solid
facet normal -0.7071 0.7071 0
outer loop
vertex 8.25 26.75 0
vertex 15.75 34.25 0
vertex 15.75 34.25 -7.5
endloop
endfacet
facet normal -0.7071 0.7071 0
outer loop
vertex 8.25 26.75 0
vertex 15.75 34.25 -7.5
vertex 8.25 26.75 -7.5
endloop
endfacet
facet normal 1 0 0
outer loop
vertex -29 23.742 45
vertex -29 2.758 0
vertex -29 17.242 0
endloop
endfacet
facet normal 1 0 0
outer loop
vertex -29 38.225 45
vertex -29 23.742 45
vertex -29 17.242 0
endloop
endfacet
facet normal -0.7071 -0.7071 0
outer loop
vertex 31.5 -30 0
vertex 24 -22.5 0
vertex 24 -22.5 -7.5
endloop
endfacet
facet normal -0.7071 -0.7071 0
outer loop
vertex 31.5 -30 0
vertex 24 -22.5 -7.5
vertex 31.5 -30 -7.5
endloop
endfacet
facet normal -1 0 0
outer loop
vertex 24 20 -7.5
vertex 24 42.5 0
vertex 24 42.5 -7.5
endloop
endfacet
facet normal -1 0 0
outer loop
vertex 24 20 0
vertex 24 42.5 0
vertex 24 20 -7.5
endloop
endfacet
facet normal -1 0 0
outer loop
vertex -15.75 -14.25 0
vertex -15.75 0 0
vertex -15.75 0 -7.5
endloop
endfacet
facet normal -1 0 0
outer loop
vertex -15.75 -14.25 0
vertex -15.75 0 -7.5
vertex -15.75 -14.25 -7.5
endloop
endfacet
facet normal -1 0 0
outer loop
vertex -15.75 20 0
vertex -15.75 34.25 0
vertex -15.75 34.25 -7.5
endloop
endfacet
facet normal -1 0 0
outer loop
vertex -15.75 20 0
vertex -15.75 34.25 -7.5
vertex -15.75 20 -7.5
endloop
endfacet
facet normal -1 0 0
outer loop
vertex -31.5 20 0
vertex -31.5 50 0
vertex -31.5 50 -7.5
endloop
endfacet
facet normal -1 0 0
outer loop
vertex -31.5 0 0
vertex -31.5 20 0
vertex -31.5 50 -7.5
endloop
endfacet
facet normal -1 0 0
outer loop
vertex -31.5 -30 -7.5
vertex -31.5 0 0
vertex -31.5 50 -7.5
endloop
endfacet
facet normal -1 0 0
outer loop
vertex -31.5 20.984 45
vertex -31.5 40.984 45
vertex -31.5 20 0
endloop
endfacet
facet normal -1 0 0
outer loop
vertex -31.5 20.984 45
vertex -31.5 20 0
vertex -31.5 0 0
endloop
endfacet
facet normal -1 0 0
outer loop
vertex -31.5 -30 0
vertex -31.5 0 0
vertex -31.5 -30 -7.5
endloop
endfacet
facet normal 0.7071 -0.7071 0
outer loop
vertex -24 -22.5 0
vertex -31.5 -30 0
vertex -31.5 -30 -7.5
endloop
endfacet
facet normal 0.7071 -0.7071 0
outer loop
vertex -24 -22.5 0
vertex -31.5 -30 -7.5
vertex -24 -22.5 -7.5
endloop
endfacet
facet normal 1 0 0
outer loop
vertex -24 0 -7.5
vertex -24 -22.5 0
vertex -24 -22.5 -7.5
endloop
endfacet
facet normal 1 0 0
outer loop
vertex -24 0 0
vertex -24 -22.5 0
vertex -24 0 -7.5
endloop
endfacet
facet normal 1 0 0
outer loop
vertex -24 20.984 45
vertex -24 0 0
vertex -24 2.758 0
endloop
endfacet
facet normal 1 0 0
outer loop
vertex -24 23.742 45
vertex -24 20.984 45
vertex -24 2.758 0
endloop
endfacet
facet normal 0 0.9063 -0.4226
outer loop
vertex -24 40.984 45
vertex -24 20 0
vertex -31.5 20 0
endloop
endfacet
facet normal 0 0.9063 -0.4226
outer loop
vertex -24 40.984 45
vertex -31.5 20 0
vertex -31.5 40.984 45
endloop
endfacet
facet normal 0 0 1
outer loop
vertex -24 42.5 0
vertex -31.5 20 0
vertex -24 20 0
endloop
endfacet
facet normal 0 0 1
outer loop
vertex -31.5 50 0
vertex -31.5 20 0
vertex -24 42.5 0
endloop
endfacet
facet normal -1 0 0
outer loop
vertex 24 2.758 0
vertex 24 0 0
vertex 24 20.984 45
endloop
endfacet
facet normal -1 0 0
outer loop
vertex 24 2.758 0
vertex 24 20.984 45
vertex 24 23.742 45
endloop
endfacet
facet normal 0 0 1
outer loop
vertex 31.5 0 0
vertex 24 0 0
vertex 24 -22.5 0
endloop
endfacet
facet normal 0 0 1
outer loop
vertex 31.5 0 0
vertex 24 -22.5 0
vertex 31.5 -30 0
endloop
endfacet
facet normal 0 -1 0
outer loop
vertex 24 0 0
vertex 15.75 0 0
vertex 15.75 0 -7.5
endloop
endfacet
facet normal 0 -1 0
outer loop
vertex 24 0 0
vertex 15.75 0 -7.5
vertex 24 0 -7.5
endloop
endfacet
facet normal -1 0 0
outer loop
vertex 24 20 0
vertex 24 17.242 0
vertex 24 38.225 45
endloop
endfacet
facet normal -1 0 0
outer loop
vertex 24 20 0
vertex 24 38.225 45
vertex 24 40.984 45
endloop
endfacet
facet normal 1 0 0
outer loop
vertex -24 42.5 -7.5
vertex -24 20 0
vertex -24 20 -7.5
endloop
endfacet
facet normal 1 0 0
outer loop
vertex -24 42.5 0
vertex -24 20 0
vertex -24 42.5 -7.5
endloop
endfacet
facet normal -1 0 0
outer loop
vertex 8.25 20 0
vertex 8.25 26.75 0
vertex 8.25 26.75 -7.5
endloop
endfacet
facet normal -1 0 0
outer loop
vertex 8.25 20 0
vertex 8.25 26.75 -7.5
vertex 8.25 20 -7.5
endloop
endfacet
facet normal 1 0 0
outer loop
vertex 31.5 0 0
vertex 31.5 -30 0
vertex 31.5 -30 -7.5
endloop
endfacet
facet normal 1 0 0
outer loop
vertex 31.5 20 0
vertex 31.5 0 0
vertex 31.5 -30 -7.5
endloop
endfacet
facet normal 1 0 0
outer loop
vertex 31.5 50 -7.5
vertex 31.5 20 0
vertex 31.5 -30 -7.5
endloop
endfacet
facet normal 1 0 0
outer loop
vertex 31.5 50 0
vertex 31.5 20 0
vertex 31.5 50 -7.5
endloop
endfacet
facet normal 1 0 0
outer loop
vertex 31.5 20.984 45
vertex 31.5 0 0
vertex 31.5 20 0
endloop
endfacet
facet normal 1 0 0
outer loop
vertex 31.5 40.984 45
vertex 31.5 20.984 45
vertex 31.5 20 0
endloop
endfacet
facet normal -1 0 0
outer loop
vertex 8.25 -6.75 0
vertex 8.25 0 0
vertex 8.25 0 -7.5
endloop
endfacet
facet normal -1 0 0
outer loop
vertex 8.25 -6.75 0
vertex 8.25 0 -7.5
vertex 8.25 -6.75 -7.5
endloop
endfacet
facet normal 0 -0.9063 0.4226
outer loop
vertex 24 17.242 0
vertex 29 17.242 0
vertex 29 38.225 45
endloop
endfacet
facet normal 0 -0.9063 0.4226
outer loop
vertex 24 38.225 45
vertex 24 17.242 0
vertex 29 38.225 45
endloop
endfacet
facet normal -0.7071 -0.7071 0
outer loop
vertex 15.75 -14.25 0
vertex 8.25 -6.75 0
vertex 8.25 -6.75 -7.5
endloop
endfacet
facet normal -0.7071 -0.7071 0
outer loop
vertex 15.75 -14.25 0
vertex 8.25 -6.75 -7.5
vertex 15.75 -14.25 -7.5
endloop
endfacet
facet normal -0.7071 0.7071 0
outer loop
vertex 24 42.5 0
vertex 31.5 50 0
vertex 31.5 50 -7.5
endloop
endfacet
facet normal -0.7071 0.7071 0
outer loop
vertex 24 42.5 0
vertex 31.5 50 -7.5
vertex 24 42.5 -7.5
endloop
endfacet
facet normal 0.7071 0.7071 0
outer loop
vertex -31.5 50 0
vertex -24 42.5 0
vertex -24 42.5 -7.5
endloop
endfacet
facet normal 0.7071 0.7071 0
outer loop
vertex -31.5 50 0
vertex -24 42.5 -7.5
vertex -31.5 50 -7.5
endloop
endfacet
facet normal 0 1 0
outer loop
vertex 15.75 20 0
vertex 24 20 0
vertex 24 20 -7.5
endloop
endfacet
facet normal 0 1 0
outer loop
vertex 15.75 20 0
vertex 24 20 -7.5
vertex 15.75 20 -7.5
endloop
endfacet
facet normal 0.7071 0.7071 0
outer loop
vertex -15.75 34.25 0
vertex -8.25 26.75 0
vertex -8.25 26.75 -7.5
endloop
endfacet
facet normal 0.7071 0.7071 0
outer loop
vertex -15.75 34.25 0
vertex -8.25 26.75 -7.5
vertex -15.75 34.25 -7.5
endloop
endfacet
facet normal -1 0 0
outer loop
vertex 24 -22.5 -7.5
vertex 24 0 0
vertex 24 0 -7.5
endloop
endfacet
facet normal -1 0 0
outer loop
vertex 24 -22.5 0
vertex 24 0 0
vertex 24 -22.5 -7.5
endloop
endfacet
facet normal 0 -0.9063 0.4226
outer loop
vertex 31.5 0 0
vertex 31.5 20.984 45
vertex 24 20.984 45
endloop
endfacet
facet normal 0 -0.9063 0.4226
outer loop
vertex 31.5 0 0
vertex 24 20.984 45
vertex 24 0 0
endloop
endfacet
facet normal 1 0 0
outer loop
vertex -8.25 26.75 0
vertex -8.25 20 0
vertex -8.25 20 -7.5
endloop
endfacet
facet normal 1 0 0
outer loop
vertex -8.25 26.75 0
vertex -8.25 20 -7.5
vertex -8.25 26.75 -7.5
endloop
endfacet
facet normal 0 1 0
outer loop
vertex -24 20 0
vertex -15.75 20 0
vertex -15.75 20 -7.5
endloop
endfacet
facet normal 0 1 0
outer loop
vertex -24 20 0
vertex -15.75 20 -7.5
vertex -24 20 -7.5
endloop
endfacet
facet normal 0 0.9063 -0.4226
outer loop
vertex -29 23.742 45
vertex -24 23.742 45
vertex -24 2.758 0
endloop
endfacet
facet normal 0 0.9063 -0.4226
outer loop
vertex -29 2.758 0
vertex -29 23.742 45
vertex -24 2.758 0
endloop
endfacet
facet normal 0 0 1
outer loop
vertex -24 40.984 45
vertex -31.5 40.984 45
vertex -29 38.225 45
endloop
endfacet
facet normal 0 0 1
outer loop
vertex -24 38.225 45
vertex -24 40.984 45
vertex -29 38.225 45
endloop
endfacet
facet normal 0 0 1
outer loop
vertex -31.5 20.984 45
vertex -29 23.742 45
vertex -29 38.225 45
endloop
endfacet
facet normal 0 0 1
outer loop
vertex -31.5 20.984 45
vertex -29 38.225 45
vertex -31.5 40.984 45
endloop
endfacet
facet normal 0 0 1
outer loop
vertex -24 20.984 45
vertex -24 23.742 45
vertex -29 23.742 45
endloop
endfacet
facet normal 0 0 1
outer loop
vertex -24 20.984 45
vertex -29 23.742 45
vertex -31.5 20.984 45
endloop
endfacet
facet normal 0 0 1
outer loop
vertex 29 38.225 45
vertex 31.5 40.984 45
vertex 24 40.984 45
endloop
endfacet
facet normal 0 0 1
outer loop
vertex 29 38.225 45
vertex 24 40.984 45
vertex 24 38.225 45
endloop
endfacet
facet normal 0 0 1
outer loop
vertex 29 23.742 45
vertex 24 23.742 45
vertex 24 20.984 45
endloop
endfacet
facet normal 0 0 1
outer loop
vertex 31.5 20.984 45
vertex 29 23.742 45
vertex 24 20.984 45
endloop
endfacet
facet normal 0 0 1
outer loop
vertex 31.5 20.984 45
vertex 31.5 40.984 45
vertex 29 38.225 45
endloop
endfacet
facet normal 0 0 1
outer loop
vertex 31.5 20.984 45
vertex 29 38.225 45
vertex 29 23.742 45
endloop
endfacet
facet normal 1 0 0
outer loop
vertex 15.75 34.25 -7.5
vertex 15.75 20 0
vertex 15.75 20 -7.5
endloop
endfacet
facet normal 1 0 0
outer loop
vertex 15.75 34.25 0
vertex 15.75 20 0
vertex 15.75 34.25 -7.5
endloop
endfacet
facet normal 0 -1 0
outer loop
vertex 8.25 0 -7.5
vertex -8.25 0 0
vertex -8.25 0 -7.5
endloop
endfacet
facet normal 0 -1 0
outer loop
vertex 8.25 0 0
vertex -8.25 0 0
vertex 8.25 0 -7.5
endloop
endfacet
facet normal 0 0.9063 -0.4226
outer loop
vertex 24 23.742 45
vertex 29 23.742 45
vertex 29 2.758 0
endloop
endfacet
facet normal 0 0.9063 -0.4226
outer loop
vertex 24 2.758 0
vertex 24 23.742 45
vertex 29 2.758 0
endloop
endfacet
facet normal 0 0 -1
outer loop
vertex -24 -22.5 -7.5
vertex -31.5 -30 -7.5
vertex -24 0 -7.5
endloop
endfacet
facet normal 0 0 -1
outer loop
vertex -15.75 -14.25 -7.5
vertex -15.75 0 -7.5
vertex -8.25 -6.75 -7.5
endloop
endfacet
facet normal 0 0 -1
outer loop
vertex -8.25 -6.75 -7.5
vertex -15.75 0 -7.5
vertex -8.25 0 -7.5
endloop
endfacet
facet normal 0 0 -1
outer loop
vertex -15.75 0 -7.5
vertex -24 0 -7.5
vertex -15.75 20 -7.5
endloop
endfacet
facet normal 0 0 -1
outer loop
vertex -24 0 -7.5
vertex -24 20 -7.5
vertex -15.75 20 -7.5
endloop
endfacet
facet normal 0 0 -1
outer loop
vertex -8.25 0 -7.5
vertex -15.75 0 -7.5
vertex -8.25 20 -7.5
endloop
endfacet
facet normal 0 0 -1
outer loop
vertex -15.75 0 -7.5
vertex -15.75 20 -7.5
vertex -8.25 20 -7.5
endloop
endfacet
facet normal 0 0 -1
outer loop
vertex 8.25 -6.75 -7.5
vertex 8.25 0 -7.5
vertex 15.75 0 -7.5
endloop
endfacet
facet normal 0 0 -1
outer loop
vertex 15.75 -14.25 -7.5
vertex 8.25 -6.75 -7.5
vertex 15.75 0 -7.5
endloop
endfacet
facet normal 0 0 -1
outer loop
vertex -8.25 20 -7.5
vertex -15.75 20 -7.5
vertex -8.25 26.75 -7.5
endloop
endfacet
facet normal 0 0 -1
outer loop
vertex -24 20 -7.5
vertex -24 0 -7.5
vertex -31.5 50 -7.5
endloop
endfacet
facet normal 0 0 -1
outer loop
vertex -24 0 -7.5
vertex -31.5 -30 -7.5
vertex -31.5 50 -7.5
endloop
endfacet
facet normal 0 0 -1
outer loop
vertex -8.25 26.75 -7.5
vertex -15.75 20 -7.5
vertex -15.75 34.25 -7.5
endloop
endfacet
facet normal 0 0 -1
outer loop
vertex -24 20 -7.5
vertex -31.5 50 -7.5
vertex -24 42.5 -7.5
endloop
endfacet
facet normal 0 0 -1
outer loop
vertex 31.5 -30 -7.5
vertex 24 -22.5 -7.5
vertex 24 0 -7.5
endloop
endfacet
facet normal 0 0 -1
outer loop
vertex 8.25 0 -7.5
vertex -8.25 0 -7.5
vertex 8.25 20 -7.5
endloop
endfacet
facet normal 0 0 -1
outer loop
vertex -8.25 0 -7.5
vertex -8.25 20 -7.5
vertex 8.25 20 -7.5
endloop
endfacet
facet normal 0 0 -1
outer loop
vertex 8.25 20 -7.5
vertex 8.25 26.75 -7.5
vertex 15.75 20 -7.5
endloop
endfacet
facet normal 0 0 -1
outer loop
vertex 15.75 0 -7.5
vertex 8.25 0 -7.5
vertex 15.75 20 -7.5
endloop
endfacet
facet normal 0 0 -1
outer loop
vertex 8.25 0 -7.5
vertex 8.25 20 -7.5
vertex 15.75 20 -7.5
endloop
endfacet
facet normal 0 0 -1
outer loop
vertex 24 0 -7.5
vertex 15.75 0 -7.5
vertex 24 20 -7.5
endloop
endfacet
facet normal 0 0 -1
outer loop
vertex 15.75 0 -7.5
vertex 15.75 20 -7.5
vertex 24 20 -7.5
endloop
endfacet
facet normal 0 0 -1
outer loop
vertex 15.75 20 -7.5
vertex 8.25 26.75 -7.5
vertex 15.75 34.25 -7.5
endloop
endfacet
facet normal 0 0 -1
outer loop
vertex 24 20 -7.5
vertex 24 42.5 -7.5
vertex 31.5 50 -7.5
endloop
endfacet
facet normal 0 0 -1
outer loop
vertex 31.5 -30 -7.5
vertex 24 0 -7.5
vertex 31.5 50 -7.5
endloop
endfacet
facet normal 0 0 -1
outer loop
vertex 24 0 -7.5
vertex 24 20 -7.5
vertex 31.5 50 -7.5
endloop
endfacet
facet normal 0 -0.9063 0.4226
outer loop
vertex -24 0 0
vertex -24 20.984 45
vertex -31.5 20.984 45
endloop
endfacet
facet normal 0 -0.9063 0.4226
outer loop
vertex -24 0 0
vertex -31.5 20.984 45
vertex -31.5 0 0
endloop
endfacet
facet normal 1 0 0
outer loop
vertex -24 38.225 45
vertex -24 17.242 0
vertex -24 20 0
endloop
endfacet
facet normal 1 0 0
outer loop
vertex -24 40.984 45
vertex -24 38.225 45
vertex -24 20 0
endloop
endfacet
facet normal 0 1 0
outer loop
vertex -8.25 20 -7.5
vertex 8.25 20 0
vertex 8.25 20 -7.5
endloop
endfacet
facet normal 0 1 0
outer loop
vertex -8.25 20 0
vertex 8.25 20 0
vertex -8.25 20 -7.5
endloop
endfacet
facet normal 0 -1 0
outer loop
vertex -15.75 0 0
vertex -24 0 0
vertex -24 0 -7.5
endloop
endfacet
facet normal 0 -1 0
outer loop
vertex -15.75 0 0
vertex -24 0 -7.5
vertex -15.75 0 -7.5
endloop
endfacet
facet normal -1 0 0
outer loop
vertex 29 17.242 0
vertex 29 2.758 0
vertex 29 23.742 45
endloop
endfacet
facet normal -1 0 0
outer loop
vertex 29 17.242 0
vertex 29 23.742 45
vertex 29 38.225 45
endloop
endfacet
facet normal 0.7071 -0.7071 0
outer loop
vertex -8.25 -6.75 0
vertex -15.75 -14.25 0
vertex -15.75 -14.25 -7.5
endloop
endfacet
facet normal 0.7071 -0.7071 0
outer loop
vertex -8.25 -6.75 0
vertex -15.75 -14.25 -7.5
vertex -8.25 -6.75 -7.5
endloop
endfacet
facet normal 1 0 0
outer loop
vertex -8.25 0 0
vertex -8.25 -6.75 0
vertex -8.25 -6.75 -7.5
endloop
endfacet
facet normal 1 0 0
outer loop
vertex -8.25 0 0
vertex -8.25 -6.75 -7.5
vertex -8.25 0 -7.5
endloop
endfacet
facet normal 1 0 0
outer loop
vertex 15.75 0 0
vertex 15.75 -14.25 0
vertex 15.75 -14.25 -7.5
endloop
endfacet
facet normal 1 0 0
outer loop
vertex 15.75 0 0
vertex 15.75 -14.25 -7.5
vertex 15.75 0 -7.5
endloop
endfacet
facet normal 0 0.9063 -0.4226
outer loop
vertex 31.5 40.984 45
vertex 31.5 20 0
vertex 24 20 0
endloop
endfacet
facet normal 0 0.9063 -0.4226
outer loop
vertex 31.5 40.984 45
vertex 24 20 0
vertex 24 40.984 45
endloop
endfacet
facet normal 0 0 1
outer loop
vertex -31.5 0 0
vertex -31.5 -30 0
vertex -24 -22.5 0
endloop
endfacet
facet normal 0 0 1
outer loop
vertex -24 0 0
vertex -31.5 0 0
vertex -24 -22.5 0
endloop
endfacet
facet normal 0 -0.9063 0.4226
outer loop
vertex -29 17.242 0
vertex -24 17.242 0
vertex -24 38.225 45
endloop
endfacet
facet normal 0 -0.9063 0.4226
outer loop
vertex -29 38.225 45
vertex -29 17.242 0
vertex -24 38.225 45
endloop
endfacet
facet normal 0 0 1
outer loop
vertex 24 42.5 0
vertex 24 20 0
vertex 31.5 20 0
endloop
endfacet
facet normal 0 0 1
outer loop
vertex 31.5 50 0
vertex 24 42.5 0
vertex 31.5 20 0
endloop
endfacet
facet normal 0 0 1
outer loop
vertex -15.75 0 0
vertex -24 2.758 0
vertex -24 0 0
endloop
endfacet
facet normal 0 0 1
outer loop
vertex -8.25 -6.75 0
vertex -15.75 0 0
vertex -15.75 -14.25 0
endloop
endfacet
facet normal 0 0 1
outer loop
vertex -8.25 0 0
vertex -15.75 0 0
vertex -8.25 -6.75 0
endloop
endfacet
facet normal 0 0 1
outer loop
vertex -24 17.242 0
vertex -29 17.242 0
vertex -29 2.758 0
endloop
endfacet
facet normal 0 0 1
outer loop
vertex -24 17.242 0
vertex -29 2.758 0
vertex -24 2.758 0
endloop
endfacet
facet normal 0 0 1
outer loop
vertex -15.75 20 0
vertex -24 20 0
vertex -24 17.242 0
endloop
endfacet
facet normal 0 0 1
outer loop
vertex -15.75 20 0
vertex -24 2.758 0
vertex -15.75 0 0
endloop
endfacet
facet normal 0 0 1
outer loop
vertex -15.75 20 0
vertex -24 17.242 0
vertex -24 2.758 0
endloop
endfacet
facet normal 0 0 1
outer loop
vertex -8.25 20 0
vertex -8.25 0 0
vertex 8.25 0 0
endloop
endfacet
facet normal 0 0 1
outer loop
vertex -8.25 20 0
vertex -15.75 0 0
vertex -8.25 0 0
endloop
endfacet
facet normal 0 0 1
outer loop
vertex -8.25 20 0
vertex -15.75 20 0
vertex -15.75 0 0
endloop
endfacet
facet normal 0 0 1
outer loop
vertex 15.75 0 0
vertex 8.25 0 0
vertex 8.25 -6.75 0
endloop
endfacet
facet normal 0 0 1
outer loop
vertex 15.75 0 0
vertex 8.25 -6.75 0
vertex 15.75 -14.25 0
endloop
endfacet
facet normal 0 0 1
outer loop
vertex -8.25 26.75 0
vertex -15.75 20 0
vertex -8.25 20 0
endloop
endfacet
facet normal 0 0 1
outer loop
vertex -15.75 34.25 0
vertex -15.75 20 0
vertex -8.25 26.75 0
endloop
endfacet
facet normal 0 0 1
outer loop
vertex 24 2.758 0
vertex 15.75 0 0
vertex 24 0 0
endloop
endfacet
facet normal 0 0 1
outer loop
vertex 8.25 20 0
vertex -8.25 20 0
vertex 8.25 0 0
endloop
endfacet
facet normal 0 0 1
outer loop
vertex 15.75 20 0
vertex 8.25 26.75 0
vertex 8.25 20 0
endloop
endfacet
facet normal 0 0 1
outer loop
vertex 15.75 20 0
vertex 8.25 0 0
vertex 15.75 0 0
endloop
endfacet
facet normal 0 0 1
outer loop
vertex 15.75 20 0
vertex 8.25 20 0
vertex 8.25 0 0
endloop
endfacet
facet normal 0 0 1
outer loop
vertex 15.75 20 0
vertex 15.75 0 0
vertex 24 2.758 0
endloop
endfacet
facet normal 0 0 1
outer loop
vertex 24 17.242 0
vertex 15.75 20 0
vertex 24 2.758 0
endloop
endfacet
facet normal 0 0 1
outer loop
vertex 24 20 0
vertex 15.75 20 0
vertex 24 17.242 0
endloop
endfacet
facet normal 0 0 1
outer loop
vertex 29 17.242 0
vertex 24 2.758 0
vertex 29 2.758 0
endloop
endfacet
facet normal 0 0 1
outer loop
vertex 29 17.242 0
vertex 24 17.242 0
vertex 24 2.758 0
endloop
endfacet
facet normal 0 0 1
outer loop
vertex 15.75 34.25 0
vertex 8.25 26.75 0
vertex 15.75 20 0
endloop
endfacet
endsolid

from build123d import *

# Parameters (mm, degrees)
F1_DEPTH = 31.5
F2_DEPTH = 29
F3_DEPTH = 24
F5_DEPTH = 7.5


with BuildPart() as f1:
    # F0 (on Right) → F1 (new body, symmetric)
    with BuildSketch(Plane.YZ):
        Polygon((20.983844617, 45), (0, 0), (2.7584447974, 0), (23.7422894144, 45), align=None)
        Polygon((23.7422894144, 45), (2.7584447974, 0), (17.2415552026, 0), (38.2253998196, 45), align=None)
        Polygon((38.2253998196, 45), (17.2415552026, 0), (20, 0), (40.983844617, 45), align=None)
    extrude(amount=F1_DEPTH, both=True)

    # F0 (on Right) → F2 (cut, symmetric)
    with BuildSketch(Plane.YZ):
        Polygon((23.7422894144, 45), (2.7584447974, 0), (17.2415552026, 0), (38.2253998196, 45), align=None)
    extrude(amount=F2_DEPTH, both=True, mode=Mode.SUBTRACT)

    # F0 (on Right) → F3 (cut, symmetric)
    with BuildSketch(Plane.YZ):
        Polygon((20.983844617, 45), (0, 0), (2.7584447974, 0), (23.7422894144, 45), align=None)
        Polygon((23.7422894144, 45), (2.7584447974, 0), (17.2415552026, 0), (38.2253998196, 45), align=None)
        Polygon((38.2253998196, 45), (17.2415552026, 0), (20, 0), (40.983844617, 45), align=None)
    extrude(amount=F3_DEPTH, both=True, mode=Mode.SUBTRACT)

    # F4 (on Top) → F5 (join)
    with BuildSketch(Plane.XY):
        Polygon((-31.5, 50), (-31.5, 20), (-31.5, 0), (-31.5, -30), (-24, -22.5), (-24, 0), (-15.75, 0), (-8.25, 0), (8.25, 0), (15.75, 0), (24, 0), (24, -22.5), (31.5, -30), (31.5, 0), (31.5, 20), (31.5, 50), (24, 42.5), (24, 20), (15.75, 20), (8.25, 20), (-8.25, 20), (-15.75, 20), (-24, 20), (-24, 42.5), align=None)
        Polygon((-15.75, 34.25), (-15.75, 20), (-8.25, 20), (-8.25, 26.75), align=None)
        Polygon((-8.25, 0), (-15.75, 0), (-15.75, -14.25), (-8.25, -6.75), align=None)
        Polygon((15.75, 0), (8.25, 0), (8.25, -6.75), (15.75, -14.25), align=None)
        Polygon((8.25, 26.75), (8.25, 20), (15.75, 20), (15.75, 34.25), align=None)
    extrude(amount=-F5_DEPTH)


solid = f1.part
